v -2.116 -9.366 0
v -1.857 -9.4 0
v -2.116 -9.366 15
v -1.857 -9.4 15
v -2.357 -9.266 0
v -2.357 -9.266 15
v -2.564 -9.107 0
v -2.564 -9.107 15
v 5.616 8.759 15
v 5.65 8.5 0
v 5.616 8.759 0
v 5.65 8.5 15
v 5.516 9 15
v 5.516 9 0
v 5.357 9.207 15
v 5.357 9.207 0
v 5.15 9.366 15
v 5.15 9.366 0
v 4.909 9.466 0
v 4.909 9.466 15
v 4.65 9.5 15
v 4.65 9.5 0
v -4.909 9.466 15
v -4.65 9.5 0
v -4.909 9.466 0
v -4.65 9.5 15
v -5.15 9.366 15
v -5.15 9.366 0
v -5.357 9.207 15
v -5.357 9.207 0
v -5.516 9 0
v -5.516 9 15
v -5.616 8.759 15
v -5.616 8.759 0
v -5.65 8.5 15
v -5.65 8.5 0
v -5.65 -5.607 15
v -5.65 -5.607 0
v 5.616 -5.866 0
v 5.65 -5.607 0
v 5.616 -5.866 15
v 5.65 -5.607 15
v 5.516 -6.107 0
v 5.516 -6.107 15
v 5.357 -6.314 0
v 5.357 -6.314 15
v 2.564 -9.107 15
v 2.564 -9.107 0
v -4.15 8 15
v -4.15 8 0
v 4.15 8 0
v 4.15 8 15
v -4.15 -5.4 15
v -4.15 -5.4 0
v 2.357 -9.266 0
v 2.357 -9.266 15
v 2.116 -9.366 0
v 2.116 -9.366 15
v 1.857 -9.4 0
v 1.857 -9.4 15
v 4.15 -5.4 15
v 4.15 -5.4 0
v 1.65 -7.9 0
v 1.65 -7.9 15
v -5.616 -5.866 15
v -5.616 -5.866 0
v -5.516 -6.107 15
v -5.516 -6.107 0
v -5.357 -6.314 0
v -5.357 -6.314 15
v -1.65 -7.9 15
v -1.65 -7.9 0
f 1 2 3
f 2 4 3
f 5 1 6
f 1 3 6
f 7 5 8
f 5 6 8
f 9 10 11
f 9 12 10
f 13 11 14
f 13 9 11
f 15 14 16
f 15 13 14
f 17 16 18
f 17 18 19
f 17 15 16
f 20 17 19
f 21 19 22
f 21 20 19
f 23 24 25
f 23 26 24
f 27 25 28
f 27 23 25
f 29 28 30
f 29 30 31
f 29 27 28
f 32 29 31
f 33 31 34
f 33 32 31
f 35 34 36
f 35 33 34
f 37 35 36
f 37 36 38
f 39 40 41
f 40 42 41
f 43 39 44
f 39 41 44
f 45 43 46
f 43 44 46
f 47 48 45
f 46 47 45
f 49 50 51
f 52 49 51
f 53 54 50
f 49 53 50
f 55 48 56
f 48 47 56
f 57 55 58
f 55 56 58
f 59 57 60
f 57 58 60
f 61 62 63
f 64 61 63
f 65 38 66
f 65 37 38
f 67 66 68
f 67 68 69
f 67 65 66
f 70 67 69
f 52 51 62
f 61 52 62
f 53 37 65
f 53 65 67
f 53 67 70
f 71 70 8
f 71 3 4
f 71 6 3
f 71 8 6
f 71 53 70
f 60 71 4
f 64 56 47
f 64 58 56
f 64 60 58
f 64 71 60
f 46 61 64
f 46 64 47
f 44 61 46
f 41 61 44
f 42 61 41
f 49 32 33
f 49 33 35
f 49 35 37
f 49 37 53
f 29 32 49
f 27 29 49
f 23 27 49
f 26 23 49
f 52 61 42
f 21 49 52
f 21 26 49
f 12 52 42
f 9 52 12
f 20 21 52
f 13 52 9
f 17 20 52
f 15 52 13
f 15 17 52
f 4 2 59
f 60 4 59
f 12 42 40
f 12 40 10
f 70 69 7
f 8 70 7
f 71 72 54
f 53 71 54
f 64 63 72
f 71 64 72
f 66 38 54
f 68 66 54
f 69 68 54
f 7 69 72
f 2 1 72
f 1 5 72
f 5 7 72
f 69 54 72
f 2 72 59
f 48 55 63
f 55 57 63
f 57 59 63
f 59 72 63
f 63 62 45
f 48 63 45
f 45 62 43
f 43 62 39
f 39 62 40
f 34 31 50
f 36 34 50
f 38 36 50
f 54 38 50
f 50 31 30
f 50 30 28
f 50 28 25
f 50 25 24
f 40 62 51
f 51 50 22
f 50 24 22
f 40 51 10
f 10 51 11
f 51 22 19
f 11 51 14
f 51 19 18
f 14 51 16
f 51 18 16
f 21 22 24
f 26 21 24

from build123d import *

# Parameters (mm, degrees)
F1_DEPTH = 15
F2_R     = 1


with BuildPart() as f1:
    # F0 (on Top) → F1 (new body)
    with BuildSketch(Plane.XY):
        Polygon((5.65, -6.02132), (5.65, 9.5), (-5.65, 9.5), (-5.65, -6.02132), (-2.27132, -9.4), (2.27132, -9.4), align=None)
        Polygon((-4.15, 8), (4.15, 8), (4.15, -5.4), (1.65, -7.9), (-1.65, -7.9), (-4.15, -5.4), align=None, mode=Mode.SUBTRACT)
    extrude(amount=F1_DEPTH)

    # F2
    f2_edges = [f1.edges().sort_by_distance(p)[0] for p in [
        (-5.65, 9.5, 7.5),
        (5.65, 9.5, 7.5),
        (5.65, -6.02132, 7.5),
        (2.27132, -9.4, 7.5),
        (-2.27132, -9.4, 7.5),
        (-5.65, -6.02132, 7.5),
    ]]
    fillet(f2_edges, radius=F2_R)


solid = f1.part
